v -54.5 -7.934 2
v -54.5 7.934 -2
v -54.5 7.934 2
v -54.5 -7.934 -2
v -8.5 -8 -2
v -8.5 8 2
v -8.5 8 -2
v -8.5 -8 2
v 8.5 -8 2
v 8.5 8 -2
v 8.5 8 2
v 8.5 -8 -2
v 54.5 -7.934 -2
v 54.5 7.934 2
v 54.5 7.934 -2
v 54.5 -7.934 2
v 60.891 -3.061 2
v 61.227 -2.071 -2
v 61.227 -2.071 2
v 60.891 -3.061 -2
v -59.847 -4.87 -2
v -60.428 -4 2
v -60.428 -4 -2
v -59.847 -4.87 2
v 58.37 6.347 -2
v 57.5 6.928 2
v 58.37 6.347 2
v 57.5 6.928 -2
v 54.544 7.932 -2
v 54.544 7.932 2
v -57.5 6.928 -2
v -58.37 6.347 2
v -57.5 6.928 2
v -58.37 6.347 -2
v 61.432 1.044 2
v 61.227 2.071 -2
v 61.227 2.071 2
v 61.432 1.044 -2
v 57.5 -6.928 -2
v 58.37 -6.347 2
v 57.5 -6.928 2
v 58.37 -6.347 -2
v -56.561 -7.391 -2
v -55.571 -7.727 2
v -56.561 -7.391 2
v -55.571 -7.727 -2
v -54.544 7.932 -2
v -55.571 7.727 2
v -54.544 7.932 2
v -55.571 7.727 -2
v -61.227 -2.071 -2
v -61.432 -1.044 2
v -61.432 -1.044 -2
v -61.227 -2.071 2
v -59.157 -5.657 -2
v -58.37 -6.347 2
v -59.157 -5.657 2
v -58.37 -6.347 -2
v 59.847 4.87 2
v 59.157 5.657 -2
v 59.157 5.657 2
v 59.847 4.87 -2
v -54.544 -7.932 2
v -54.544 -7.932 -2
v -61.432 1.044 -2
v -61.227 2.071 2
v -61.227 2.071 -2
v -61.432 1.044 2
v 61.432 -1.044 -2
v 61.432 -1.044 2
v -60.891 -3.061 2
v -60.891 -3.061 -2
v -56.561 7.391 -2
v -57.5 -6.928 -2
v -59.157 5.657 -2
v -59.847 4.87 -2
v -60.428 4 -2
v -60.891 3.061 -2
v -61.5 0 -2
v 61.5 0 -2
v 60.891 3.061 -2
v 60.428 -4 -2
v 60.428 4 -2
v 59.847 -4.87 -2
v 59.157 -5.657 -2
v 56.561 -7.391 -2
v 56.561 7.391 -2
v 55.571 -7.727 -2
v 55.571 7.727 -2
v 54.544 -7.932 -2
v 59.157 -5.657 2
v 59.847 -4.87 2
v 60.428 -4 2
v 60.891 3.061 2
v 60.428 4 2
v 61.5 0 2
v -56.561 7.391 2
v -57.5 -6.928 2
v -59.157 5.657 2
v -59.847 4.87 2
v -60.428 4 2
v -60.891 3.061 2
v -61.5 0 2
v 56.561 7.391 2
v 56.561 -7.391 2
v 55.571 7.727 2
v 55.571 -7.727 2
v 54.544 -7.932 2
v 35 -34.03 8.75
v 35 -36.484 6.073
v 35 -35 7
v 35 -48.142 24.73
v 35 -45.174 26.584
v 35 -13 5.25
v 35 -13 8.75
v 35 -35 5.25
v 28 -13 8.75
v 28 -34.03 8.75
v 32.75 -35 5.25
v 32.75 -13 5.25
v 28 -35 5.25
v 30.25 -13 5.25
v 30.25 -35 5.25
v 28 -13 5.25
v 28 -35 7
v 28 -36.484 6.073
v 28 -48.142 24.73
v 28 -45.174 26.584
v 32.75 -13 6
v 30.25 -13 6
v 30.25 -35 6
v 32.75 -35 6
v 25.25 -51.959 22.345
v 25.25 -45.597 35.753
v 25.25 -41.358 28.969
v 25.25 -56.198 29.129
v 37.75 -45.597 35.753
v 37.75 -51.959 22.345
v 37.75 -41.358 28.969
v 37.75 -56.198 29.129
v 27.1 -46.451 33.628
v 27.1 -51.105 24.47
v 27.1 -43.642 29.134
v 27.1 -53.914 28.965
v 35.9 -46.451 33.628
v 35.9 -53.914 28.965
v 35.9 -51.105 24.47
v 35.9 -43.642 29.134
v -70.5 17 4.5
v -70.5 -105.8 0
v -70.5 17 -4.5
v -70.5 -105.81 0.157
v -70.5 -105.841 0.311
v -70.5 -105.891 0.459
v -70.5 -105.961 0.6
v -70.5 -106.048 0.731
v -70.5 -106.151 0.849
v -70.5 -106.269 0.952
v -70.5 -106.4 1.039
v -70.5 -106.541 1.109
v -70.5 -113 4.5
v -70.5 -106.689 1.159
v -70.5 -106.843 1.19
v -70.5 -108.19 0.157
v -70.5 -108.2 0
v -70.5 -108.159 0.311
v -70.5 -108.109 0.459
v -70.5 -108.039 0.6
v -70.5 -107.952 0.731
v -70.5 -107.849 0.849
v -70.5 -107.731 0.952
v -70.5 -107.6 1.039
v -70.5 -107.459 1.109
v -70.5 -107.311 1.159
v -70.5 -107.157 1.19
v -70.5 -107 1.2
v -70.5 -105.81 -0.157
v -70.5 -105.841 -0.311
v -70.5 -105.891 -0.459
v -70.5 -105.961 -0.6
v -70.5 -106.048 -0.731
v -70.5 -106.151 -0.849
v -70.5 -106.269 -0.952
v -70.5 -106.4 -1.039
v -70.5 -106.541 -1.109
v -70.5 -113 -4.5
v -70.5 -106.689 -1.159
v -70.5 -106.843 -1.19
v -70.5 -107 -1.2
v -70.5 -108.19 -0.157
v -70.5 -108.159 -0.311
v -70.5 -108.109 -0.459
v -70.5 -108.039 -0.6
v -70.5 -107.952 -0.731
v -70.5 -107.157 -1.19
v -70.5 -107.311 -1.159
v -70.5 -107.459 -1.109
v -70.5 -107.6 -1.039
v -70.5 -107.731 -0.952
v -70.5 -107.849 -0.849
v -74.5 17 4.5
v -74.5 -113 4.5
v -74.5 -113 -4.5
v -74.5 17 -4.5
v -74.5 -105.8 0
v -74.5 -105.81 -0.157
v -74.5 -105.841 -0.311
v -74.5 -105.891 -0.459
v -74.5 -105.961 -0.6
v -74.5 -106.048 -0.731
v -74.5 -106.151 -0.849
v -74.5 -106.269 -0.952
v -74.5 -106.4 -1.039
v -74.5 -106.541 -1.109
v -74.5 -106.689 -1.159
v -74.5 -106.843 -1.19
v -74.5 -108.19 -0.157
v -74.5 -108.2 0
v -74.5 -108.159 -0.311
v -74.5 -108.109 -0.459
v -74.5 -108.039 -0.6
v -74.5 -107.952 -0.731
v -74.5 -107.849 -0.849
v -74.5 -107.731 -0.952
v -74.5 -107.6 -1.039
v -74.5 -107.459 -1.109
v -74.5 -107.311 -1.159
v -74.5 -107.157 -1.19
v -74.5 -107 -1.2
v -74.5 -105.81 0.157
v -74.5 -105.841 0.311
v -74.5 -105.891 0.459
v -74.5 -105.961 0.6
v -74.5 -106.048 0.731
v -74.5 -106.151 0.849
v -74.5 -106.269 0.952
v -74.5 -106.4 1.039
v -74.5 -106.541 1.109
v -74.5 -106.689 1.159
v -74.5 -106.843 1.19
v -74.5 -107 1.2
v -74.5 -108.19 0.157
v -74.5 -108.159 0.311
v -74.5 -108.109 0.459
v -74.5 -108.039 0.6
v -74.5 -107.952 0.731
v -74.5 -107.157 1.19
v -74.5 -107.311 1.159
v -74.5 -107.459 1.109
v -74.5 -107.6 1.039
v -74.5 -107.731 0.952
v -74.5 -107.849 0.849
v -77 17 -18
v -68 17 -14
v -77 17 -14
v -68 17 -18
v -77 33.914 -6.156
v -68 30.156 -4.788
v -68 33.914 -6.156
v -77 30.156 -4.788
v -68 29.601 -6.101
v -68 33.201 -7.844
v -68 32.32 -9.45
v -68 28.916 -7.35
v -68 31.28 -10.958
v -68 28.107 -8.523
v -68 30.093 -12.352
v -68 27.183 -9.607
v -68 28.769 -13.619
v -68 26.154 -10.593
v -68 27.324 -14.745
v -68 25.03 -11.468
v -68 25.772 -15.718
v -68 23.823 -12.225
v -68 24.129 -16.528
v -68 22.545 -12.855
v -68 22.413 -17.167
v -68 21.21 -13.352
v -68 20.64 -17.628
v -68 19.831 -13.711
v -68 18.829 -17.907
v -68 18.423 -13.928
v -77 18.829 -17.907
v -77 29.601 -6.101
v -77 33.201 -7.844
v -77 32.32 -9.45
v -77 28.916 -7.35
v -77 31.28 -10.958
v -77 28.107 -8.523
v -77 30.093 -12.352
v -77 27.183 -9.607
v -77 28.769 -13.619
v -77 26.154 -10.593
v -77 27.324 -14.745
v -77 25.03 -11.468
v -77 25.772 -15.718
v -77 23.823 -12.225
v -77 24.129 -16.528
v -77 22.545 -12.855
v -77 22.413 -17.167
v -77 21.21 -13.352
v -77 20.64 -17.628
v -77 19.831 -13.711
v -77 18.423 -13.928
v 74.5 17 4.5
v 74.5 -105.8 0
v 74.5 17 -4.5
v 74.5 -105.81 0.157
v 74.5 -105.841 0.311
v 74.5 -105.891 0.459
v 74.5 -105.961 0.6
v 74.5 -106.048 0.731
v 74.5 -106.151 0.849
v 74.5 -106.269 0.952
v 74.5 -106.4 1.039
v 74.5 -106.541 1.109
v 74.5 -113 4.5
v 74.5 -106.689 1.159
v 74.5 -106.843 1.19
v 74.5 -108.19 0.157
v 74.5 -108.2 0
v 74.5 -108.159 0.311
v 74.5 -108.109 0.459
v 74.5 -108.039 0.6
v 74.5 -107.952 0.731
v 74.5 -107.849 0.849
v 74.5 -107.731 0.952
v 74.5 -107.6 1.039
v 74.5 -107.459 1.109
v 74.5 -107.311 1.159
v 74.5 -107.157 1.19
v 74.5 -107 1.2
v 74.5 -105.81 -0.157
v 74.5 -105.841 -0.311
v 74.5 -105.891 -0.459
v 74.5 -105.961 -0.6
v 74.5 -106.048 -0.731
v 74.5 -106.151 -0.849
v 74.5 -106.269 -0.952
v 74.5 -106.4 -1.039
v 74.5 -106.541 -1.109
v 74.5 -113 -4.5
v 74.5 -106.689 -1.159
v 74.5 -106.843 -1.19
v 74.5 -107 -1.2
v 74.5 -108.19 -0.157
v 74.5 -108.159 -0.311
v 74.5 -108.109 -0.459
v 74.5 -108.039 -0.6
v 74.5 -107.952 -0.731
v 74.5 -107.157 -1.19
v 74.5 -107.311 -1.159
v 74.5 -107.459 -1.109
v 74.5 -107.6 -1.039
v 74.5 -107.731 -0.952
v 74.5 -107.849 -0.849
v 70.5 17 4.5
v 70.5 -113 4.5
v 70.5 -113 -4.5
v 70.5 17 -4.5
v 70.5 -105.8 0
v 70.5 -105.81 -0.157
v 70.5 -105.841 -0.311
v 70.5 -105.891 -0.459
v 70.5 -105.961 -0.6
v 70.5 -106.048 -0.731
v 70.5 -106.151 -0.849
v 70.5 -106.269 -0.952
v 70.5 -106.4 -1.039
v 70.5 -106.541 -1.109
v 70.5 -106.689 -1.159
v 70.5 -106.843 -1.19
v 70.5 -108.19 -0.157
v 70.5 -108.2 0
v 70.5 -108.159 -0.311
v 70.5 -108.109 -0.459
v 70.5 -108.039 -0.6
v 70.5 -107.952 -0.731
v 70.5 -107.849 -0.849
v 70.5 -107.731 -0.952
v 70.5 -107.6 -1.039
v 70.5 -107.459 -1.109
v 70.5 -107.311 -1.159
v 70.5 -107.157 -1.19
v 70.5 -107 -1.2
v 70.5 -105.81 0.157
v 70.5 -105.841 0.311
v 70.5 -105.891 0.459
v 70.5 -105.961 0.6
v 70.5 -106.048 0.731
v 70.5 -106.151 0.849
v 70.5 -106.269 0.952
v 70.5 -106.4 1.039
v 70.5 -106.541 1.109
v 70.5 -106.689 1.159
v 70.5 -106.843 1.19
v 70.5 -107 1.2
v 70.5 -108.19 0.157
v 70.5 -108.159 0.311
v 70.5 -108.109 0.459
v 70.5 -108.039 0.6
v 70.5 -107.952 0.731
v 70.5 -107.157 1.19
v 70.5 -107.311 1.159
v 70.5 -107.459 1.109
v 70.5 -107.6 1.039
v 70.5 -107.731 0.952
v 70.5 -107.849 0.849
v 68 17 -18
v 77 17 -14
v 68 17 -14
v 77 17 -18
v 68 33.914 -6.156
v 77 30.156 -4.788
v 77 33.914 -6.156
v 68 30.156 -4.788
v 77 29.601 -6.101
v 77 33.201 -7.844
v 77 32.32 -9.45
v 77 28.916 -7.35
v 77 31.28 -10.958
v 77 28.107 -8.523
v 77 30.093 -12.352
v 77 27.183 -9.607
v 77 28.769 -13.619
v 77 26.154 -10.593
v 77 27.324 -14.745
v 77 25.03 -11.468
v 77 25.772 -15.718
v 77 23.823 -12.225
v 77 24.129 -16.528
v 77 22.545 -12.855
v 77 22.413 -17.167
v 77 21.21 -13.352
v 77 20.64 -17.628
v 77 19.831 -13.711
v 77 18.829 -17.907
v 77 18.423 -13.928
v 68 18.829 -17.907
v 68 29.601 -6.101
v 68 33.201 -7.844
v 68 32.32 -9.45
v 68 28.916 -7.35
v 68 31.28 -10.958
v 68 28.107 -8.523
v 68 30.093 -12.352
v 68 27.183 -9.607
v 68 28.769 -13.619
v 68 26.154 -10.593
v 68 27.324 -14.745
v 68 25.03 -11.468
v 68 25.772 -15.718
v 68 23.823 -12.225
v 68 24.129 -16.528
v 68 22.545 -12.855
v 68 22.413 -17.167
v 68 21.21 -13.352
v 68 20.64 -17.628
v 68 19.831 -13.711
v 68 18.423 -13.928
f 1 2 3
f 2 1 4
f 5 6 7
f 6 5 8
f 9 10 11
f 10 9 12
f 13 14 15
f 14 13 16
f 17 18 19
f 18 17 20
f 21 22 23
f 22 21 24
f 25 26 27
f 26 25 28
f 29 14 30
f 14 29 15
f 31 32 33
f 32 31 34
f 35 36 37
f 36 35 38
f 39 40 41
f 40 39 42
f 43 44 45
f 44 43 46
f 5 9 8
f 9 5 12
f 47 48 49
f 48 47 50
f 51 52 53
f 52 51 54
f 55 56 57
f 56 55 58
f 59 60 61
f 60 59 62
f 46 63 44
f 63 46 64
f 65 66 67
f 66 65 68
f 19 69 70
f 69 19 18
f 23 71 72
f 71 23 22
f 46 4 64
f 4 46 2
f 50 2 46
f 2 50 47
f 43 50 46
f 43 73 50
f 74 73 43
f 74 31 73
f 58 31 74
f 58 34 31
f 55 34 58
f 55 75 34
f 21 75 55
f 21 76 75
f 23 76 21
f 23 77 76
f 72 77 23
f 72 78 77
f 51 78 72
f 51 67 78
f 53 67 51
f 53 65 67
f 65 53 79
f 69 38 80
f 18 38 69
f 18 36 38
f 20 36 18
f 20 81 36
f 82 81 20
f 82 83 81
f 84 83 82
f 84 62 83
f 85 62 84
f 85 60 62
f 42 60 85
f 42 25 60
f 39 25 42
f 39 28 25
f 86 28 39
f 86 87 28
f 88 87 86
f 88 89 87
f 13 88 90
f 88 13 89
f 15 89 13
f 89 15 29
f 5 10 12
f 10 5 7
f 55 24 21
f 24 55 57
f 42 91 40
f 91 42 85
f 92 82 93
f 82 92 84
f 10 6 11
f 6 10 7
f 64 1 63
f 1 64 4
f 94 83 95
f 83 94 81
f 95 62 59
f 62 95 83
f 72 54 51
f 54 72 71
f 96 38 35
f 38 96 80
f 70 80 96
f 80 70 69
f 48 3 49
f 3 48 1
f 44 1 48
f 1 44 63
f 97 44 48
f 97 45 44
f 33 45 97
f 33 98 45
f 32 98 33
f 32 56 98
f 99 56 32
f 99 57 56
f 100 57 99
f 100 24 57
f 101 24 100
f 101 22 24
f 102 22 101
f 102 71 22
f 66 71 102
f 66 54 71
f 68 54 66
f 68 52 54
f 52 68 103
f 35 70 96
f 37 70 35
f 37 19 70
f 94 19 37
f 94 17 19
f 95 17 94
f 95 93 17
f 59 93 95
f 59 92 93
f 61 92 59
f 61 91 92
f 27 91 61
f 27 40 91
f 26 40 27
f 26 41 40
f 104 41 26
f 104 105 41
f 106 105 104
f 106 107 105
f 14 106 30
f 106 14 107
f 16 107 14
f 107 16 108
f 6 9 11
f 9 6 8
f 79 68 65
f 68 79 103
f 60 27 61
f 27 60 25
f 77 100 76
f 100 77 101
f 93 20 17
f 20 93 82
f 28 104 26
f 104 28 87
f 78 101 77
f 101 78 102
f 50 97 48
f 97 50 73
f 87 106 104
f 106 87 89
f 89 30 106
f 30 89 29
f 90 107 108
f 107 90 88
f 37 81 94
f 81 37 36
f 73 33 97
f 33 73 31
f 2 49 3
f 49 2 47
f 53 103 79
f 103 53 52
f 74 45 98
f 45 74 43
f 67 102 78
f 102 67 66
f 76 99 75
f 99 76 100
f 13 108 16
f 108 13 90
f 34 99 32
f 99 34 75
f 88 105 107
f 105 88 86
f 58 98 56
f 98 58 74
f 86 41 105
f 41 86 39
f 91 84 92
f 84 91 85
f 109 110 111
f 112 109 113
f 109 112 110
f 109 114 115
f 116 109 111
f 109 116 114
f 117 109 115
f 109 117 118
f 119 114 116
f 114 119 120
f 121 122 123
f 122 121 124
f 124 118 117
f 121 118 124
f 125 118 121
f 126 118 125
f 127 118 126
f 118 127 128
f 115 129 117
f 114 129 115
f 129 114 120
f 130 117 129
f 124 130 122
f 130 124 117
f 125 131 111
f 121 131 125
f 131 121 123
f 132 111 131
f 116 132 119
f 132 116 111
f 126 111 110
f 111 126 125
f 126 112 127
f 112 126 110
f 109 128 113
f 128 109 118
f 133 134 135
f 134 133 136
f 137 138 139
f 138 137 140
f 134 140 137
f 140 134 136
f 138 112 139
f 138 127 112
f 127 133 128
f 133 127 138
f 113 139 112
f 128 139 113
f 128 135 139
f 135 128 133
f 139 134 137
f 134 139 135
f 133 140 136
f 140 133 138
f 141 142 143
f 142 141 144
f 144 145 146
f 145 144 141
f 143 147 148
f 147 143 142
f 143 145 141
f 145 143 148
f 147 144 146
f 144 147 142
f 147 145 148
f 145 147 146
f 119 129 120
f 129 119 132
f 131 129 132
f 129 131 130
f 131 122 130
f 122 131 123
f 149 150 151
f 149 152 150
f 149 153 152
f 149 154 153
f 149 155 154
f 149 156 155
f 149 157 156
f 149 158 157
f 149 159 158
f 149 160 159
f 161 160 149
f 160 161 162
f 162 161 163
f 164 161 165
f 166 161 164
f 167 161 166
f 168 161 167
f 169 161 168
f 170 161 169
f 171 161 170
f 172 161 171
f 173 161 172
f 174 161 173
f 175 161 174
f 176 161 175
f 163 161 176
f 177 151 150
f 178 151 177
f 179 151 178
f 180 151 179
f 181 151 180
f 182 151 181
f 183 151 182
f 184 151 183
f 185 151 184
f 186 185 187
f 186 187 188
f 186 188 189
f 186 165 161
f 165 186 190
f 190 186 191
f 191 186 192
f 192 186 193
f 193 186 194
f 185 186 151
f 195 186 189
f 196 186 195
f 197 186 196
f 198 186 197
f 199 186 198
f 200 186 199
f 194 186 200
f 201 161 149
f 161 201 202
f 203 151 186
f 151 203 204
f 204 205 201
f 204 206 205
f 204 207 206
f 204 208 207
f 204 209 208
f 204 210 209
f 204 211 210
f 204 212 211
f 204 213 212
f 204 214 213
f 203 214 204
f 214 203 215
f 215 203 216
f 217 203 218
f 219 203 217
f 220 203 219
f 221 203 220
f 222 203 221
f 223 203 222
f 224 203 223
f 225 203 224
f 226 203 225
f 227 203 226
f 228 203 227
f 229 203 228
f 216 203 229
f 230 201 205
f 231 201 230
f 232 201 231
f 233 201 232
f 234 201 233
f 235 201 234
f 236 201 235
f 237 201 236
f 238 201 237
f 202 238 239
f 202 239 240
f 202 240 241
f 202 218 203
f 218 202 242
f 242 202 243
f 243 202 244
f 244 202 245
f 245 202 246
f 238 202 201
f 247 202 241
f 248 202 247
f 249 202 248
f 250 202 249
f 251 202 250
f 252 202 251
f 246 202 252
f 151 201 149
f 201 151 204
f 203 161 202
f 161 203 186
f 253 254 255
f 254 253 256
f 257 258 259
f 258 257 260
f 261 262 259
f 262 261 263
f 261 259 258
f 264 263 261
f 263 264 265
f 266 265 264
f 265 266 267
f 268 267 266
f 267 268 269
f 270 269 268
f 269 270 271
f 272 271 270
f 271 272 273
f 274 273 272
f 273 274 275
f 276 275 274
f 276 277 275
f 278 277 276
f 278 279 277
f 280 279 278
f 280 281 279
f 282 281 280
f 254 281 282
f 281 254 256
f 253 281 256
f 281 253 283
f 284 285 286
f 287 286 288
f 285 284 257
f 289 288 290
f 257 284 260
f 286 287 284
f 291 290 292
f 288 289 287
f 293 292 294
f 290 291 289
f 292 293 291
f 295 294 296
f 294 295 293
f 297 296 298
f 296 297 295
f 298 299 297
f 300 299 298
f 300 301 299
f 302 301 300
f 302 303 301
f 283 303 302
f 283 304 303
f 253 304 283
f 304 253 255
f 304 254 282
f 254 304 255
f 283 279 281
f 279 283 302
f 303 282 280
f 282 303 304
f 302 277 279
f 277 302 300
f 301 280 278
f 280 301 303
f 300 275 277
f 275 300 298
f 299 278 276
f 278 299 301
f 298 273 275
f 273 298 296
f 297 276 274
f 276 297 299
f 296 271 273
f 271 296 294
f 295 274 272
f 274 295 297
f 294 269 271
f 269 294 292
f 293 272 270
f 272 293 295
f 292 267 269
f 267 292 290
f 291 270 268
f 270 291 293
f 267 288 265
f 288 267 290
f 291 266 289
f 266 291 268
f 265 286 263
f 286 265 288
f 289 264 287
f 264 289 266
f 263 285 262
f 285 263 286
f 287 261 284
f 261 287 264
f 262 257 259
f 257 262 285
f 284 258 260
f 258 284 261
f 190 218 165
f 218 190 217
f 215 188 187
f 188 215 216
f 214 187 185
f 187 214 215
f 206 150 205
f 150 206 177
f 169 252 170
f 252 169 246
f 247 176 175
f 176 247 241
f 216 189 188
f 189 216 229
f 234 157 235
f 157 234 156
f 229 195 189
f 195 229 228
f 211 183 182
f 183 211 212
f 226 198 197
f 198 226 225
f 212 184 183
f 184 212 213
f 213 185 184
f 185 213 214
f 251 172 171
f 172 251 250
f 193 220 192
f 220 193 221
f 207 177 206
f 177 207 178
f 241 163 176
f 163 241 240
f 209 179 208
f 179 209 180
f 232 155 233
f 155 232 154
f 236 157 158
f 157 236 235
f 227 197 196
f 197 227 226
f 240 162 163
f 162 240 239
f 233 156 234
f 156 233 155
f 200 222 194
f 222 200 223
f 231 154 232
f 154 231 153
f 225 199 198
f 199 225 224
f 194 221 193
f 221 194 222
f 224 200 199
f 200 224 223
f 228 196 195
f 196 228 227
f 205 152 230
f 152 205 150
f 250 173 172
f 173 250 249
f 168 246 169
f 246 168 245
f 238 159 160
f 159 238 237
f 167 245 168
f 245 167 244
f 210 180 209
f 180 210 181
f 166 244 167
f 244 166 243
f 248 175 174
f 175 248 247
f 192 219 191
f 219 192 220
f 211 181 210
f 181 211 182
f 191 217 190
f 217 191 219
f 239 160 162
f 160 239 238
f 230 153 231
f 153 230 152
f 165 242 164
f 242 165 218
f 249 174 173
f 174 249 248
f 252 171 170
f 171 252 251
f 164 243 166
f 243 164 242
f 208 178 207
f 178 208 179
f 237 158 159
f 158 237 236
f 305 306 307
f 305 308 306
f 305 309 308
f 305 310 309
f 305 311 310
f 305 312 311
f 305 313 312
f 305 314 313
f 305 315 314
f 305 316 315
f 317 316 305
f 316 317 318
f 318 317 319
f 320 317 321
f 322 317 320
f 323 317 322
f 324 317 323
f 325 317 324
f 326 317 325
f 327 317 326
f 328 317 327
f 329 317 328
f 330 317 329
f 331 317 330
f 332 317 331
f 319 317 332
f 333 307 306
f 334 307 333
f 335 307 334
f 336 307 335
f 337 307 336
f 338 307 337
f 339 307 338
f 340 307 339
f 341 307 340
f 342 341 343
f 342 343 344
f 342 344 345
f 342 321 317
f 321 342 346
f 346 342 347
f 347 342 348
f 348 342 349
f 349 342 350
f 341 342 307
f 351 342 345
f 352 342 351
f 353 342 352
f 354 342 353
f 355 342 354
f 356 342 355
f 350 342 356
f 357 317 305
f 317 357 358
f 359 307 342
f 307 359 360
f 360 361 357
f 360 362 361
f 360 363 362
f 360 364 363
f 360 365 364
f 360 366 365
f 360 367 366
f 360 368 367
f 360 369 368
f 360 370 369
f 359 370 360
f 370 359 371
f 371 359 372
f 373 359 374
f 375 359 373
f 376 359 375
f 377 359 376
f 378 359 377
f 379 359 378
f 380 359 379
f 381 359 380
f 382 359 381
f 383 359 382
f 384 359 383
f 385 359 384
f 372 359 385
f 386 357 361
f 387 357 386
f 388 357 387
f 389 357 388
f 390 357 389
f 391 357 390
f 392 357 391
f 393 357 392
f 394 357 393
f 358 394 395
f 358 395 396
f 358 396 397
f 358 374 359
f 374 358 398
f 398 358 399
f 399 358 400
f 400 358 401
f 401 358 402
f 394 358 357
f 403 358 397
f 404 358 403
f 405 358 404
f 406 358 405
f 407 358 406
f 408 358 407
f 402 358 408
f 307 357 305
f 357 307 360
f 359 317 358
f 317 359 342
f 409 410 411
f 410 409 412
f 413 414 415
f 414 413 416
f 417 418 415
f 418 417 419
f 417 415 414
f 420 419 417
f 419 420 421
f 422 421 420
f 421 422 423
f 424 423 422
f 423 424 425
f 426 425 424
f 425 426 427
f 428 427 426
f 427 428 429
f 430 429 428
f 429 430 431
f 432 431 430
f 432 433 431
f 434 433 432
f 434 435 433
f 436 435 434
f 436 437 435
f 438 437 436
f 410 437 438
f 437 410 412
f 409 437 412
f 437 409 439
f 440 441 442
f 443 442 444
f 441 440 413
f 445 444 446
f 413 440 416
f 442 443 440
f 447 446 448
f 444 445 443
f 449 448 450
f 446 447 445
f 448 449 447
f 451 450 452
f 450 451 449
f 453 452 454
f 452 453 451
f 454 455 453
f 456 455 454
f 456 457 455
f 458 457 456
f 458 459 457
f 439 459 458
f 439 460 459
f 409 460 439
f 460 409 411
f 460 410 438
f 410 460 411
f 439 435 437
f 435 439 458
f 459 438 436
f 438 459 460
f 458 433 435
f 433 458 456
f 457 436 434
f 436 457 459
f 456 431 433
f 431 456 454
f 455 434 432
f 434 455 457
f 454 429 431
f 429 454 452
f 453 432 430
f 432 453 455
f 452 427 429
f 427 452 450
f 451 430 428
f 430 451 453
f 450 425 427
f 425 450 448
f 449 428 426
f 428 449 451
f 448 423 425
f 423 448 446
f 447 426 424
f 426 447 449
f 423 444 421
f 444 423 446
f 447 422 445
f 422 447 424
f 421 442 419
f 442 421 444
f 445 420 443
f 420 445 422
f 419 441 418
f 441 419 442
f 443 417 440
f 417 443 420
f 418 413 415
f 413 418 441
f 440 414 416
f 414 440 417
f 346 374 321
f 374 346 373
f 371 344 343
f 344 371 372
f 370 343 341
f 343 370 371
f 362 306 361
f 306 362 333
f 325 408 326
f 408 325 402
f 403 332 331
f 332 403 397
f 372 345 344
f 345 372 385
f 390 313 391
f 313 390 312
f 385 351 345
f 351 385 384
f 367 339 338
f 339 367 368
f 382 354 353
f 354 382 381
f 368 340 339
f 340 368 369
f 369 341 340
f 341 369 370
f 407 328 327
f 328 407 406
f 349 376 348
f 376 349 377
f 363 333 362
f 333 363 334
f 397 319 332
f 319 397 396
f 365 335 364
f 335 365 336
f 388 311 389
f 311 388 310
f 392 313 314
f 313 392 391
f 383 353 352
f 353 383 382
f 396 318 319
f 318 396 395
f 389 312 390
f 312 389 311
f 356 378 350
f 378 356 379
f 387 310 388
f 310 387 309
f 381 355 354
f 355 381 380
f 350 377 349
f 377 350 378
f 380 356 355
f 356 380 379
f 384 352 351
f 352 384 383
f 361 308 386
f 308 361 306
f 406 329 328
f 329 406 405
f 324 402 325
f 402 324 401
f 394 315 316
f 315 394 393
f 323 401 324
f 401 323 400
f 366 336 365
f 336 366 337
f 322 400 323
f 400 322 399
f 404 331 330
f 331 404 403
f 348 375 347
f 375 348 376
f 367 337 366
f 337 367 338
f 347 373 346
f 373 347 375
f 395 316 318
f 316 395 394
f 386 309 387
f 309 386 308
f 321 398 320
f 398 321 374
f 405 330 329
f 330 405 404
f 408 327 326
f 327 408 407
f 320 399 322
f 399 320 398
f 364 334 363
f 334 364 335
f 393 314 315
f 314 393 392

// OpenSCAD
// Head-worn eye tracker: parametric glasses frame
//
// Holds one eye camera looking back at the right eye and one scene camera
// looking forward. Written parametrically rather than shipped as an STL so
// that the dimensions that matter can be changed for a different face or a
// different camera without redoing the model.
//
//   openscad -o frame.stl frame.scad
//   openscad -o frame_eye_arm.stl -D part=\"eye_arm\" frame.scad
//
// Print notes are at the bottom of this file.

/* [Which part] */
// "all" previews the assembly; the others are the printable parts.
part = "all";  // [all, front, eye_arm, temple]

/* [Face fit] */
// Pupillary distance. The single most important number here: get it wrong and
// the eye camera looks at a cheekbone.
pupillary_distance = 63;
// Width across the temples, at the hinge.
head_width = 145;
// Bridge width, between the lens openings.
bridge_width = 18;
// How far the front sits from the eyes.
vertex_distance = 14;

/* [Eye camera] */
// A bare USB camera module, without its housing.
eye_cam_w = 8.5;
eye_cam_h = 8.5;
eye_cam_d = 5.0;
// How far below the eye the camera sits, and how far forward.
eye_cam_drop = 22;
eye_cam_forward = 26;
// Angle up towards the eye. 30-35 degrees keeps the iris in frame across the
// full range of gaze without the arm entering the wearer's field of view.
eye_cam_pitch = 32;

/* [Scene camera] */
scene_cam_w = 12;
scene_cam_h = 12;
scene_cam_d = 6;
// Sitting on the bridge keeps it near the cyclopean eye, which minimises the
// parallax between what it sees and what the wearer sees. It cannot remove it.
scene_cam_rise = 6;

/* [Structure] */
front_thickness = 4;
front_height = 34;
lens_opening_w = 46;
lens_opening_h = 28;
temple_length = 130;
temple_thickness = 4;
arm_thickness = 3.5;
arm_width = 7;

/* [Print] */
// Clearance on every camera pocket. 0.3 mm suits a well-tuned FDM printer;
// raise it to 0.4 if parts need forcing, because forcing a camera into a
// pocket is how the lens gets scratched.
fit_clearance = 0.3;

$fn = 48;

// ---------------------------------------------------------------- front

module lens_opening() {
    // Rounded rectangle, built from a hull of four cylinders. Sharp internal
    // corners concentrate stress and this part gets flexed every time the
    // glasses are put on.
    r = 6;
    hull() {
        for (dx = [-1, 1], dy = [-1, 1])
            translate([dx * (lens_opening_w / 2 - r), dy * (lens_opening_h / 2 - r), 0])
                cylinder(r = r, h = front_thickness * 3, center = true);
    }
}

module front() {
    half = pupillary_distance / 2;
    width = pupillary_distance + lens_opening_w + 14;

    difference() {
        // Body
        hull() {
            for (dx = [-1, 1])
                translate([dx * (width / 2 - 8), 0, 0])
                    cylinder(r = 8, h = front_thickness, center = true);
        }

        // The two lens openings
        for (dx = [-1, 1])
            translate([dx * half, 0, 0]) lens_opening();

        // Bridge relief, so the frame does not sit on the nose ridge
        translate([0, -front_height / 2, 0])
            scale([bridge_width / 2, 8, 1])
                cylinder(r = 1, h = front_thickness * 3, center = true);

        // Scene camera pocket, on the bridge
        translate([0, front_height / 2 - scene_cam_h / 2 + scene_cam_rise, 0])
            cube([scene_cam_w + fit_clearance,
                  scene_cam_h + fit_clearance,
                  front_thickness * 3], center = true);
    }
}

// ---------------------------------------------------------------- eye arm

module eye_camera_pocket() {
    cube([eye_cam_w + fit_clearance,
          eye_cam_h + fit_clearance,
          eye_cam_d + fit_clearance], center = true);
}

module eye_arm() {
    // An L: down from the frame, then forward and up under the eye.
    difference() {
        union() {
            // Vertical leg
            translate([0, -eye_cam_drop / 2, 0])
                cube([arm_width, eye_cam_drop, arm_thickness], center = true);

            // Forward leg, pitched up towards the eye
            translate([0, -eye_cam_drop, 0])
                rotate([eye_cam_pitch, 0, 0])
                    translate([0, 0, eye_cam_forward / 2])
                        cube([arm_width, arm_thickness, eye_cam_forward], center = true);

            // Camera boss at the end
            translate([0, -eye_cam_drop, 0])
                rotate([eye_cam_pitch, 0, 0])
                    translate([0, 0, eye_cam_forward])
                        cube([eye_cam_w + 4, eye_cam_h + 4, eye_cam_d + 3], center = true);
        }

        // Camera pocket, opening forwards
        translate([0, -eye_cam_drop, 0])
            rotate([eye_cam_pitch, 0, 0])
                translate([0, 0, eye_cam_forward])
                    eye_camera_pocket();

        // Cable channel down the back of the arm
        translate([0, -eye_cam_drop / 2, -arm_thickness / 2])
            cube([2.5, eye_cam_drop + 2, 1.5], center = true);
    }
}

// ---------------------------------------------------------------- temple

module temple() {
    difference() {
        union() {
            cube([temple_thickness, temple_length, 9], center = true);

            // Ear hook
            translate([0, temple_length / 2, 0])
                rotate([0, 90, 0])
                    rotate_extrude(angle = 70, $fn = 64)
                        translate([16, 0, 0])
                            square([temple_thickness, 9], center = true);
        }

        // Hinge pin hole
        translate([0, -temple_length / 2 + 6, 0])
            rotate([0, 90, 0])
                cylinder(r = 1.2, h = temple_thickness * 3, center = true);
    }
}

// ---------------------------------------------------------------- assembly

module assembly() {
    color("LightSteelBlue") front();

    // Eye arm on the right eye only. One eye is enough: gaze is conjugate for
    // anything beyond arm's length, and a second eye camera doubles the
    // weight, the cabling and the synchronisation problem for very little.
    translate([pupillary_distance / 2, -front_height / 2 + 4, vertex_distance / 2])
        color("Tomato") eye_arm();

    for (dx = [-1, 1])
        translate([dx * head_width / 2, front_height / 2 - temple_length / 2, 0])
            color("Gainsboro") temple();
}

if (part == "all") assembly();
else if (part == "front") front();
else if (part == "eye_arm") eye_arm();
else if (part == "temple") temple();

// ---------------------------------------------------------------- printing
//
// PETG rather than PLA. The frame sits on a face for an hour at a time and PLA
// softens enough at skin temperature over that period to let the eye arm
// droop, which shows up as a slow drift in gaze that looks exactly like
// calibration decay and is not.
//
// Front:    flat on the bed, no supports.
// Eye arm:  on its side, supports on. This part carries the camera and any
//           layer delamination in it becomes gaze error, so 4 perimeters.
// Temple:   flat, no supports; the ear hook bridges fine at this radius.
//
// After printing, check the eye arm does not enter the wearer's field of view
// when they look down. If it does, reduce eye_cam_pitch before reducing
// eye_cam_forward -- moving the camera closer costs more accuracy than
// flattening its angle.
